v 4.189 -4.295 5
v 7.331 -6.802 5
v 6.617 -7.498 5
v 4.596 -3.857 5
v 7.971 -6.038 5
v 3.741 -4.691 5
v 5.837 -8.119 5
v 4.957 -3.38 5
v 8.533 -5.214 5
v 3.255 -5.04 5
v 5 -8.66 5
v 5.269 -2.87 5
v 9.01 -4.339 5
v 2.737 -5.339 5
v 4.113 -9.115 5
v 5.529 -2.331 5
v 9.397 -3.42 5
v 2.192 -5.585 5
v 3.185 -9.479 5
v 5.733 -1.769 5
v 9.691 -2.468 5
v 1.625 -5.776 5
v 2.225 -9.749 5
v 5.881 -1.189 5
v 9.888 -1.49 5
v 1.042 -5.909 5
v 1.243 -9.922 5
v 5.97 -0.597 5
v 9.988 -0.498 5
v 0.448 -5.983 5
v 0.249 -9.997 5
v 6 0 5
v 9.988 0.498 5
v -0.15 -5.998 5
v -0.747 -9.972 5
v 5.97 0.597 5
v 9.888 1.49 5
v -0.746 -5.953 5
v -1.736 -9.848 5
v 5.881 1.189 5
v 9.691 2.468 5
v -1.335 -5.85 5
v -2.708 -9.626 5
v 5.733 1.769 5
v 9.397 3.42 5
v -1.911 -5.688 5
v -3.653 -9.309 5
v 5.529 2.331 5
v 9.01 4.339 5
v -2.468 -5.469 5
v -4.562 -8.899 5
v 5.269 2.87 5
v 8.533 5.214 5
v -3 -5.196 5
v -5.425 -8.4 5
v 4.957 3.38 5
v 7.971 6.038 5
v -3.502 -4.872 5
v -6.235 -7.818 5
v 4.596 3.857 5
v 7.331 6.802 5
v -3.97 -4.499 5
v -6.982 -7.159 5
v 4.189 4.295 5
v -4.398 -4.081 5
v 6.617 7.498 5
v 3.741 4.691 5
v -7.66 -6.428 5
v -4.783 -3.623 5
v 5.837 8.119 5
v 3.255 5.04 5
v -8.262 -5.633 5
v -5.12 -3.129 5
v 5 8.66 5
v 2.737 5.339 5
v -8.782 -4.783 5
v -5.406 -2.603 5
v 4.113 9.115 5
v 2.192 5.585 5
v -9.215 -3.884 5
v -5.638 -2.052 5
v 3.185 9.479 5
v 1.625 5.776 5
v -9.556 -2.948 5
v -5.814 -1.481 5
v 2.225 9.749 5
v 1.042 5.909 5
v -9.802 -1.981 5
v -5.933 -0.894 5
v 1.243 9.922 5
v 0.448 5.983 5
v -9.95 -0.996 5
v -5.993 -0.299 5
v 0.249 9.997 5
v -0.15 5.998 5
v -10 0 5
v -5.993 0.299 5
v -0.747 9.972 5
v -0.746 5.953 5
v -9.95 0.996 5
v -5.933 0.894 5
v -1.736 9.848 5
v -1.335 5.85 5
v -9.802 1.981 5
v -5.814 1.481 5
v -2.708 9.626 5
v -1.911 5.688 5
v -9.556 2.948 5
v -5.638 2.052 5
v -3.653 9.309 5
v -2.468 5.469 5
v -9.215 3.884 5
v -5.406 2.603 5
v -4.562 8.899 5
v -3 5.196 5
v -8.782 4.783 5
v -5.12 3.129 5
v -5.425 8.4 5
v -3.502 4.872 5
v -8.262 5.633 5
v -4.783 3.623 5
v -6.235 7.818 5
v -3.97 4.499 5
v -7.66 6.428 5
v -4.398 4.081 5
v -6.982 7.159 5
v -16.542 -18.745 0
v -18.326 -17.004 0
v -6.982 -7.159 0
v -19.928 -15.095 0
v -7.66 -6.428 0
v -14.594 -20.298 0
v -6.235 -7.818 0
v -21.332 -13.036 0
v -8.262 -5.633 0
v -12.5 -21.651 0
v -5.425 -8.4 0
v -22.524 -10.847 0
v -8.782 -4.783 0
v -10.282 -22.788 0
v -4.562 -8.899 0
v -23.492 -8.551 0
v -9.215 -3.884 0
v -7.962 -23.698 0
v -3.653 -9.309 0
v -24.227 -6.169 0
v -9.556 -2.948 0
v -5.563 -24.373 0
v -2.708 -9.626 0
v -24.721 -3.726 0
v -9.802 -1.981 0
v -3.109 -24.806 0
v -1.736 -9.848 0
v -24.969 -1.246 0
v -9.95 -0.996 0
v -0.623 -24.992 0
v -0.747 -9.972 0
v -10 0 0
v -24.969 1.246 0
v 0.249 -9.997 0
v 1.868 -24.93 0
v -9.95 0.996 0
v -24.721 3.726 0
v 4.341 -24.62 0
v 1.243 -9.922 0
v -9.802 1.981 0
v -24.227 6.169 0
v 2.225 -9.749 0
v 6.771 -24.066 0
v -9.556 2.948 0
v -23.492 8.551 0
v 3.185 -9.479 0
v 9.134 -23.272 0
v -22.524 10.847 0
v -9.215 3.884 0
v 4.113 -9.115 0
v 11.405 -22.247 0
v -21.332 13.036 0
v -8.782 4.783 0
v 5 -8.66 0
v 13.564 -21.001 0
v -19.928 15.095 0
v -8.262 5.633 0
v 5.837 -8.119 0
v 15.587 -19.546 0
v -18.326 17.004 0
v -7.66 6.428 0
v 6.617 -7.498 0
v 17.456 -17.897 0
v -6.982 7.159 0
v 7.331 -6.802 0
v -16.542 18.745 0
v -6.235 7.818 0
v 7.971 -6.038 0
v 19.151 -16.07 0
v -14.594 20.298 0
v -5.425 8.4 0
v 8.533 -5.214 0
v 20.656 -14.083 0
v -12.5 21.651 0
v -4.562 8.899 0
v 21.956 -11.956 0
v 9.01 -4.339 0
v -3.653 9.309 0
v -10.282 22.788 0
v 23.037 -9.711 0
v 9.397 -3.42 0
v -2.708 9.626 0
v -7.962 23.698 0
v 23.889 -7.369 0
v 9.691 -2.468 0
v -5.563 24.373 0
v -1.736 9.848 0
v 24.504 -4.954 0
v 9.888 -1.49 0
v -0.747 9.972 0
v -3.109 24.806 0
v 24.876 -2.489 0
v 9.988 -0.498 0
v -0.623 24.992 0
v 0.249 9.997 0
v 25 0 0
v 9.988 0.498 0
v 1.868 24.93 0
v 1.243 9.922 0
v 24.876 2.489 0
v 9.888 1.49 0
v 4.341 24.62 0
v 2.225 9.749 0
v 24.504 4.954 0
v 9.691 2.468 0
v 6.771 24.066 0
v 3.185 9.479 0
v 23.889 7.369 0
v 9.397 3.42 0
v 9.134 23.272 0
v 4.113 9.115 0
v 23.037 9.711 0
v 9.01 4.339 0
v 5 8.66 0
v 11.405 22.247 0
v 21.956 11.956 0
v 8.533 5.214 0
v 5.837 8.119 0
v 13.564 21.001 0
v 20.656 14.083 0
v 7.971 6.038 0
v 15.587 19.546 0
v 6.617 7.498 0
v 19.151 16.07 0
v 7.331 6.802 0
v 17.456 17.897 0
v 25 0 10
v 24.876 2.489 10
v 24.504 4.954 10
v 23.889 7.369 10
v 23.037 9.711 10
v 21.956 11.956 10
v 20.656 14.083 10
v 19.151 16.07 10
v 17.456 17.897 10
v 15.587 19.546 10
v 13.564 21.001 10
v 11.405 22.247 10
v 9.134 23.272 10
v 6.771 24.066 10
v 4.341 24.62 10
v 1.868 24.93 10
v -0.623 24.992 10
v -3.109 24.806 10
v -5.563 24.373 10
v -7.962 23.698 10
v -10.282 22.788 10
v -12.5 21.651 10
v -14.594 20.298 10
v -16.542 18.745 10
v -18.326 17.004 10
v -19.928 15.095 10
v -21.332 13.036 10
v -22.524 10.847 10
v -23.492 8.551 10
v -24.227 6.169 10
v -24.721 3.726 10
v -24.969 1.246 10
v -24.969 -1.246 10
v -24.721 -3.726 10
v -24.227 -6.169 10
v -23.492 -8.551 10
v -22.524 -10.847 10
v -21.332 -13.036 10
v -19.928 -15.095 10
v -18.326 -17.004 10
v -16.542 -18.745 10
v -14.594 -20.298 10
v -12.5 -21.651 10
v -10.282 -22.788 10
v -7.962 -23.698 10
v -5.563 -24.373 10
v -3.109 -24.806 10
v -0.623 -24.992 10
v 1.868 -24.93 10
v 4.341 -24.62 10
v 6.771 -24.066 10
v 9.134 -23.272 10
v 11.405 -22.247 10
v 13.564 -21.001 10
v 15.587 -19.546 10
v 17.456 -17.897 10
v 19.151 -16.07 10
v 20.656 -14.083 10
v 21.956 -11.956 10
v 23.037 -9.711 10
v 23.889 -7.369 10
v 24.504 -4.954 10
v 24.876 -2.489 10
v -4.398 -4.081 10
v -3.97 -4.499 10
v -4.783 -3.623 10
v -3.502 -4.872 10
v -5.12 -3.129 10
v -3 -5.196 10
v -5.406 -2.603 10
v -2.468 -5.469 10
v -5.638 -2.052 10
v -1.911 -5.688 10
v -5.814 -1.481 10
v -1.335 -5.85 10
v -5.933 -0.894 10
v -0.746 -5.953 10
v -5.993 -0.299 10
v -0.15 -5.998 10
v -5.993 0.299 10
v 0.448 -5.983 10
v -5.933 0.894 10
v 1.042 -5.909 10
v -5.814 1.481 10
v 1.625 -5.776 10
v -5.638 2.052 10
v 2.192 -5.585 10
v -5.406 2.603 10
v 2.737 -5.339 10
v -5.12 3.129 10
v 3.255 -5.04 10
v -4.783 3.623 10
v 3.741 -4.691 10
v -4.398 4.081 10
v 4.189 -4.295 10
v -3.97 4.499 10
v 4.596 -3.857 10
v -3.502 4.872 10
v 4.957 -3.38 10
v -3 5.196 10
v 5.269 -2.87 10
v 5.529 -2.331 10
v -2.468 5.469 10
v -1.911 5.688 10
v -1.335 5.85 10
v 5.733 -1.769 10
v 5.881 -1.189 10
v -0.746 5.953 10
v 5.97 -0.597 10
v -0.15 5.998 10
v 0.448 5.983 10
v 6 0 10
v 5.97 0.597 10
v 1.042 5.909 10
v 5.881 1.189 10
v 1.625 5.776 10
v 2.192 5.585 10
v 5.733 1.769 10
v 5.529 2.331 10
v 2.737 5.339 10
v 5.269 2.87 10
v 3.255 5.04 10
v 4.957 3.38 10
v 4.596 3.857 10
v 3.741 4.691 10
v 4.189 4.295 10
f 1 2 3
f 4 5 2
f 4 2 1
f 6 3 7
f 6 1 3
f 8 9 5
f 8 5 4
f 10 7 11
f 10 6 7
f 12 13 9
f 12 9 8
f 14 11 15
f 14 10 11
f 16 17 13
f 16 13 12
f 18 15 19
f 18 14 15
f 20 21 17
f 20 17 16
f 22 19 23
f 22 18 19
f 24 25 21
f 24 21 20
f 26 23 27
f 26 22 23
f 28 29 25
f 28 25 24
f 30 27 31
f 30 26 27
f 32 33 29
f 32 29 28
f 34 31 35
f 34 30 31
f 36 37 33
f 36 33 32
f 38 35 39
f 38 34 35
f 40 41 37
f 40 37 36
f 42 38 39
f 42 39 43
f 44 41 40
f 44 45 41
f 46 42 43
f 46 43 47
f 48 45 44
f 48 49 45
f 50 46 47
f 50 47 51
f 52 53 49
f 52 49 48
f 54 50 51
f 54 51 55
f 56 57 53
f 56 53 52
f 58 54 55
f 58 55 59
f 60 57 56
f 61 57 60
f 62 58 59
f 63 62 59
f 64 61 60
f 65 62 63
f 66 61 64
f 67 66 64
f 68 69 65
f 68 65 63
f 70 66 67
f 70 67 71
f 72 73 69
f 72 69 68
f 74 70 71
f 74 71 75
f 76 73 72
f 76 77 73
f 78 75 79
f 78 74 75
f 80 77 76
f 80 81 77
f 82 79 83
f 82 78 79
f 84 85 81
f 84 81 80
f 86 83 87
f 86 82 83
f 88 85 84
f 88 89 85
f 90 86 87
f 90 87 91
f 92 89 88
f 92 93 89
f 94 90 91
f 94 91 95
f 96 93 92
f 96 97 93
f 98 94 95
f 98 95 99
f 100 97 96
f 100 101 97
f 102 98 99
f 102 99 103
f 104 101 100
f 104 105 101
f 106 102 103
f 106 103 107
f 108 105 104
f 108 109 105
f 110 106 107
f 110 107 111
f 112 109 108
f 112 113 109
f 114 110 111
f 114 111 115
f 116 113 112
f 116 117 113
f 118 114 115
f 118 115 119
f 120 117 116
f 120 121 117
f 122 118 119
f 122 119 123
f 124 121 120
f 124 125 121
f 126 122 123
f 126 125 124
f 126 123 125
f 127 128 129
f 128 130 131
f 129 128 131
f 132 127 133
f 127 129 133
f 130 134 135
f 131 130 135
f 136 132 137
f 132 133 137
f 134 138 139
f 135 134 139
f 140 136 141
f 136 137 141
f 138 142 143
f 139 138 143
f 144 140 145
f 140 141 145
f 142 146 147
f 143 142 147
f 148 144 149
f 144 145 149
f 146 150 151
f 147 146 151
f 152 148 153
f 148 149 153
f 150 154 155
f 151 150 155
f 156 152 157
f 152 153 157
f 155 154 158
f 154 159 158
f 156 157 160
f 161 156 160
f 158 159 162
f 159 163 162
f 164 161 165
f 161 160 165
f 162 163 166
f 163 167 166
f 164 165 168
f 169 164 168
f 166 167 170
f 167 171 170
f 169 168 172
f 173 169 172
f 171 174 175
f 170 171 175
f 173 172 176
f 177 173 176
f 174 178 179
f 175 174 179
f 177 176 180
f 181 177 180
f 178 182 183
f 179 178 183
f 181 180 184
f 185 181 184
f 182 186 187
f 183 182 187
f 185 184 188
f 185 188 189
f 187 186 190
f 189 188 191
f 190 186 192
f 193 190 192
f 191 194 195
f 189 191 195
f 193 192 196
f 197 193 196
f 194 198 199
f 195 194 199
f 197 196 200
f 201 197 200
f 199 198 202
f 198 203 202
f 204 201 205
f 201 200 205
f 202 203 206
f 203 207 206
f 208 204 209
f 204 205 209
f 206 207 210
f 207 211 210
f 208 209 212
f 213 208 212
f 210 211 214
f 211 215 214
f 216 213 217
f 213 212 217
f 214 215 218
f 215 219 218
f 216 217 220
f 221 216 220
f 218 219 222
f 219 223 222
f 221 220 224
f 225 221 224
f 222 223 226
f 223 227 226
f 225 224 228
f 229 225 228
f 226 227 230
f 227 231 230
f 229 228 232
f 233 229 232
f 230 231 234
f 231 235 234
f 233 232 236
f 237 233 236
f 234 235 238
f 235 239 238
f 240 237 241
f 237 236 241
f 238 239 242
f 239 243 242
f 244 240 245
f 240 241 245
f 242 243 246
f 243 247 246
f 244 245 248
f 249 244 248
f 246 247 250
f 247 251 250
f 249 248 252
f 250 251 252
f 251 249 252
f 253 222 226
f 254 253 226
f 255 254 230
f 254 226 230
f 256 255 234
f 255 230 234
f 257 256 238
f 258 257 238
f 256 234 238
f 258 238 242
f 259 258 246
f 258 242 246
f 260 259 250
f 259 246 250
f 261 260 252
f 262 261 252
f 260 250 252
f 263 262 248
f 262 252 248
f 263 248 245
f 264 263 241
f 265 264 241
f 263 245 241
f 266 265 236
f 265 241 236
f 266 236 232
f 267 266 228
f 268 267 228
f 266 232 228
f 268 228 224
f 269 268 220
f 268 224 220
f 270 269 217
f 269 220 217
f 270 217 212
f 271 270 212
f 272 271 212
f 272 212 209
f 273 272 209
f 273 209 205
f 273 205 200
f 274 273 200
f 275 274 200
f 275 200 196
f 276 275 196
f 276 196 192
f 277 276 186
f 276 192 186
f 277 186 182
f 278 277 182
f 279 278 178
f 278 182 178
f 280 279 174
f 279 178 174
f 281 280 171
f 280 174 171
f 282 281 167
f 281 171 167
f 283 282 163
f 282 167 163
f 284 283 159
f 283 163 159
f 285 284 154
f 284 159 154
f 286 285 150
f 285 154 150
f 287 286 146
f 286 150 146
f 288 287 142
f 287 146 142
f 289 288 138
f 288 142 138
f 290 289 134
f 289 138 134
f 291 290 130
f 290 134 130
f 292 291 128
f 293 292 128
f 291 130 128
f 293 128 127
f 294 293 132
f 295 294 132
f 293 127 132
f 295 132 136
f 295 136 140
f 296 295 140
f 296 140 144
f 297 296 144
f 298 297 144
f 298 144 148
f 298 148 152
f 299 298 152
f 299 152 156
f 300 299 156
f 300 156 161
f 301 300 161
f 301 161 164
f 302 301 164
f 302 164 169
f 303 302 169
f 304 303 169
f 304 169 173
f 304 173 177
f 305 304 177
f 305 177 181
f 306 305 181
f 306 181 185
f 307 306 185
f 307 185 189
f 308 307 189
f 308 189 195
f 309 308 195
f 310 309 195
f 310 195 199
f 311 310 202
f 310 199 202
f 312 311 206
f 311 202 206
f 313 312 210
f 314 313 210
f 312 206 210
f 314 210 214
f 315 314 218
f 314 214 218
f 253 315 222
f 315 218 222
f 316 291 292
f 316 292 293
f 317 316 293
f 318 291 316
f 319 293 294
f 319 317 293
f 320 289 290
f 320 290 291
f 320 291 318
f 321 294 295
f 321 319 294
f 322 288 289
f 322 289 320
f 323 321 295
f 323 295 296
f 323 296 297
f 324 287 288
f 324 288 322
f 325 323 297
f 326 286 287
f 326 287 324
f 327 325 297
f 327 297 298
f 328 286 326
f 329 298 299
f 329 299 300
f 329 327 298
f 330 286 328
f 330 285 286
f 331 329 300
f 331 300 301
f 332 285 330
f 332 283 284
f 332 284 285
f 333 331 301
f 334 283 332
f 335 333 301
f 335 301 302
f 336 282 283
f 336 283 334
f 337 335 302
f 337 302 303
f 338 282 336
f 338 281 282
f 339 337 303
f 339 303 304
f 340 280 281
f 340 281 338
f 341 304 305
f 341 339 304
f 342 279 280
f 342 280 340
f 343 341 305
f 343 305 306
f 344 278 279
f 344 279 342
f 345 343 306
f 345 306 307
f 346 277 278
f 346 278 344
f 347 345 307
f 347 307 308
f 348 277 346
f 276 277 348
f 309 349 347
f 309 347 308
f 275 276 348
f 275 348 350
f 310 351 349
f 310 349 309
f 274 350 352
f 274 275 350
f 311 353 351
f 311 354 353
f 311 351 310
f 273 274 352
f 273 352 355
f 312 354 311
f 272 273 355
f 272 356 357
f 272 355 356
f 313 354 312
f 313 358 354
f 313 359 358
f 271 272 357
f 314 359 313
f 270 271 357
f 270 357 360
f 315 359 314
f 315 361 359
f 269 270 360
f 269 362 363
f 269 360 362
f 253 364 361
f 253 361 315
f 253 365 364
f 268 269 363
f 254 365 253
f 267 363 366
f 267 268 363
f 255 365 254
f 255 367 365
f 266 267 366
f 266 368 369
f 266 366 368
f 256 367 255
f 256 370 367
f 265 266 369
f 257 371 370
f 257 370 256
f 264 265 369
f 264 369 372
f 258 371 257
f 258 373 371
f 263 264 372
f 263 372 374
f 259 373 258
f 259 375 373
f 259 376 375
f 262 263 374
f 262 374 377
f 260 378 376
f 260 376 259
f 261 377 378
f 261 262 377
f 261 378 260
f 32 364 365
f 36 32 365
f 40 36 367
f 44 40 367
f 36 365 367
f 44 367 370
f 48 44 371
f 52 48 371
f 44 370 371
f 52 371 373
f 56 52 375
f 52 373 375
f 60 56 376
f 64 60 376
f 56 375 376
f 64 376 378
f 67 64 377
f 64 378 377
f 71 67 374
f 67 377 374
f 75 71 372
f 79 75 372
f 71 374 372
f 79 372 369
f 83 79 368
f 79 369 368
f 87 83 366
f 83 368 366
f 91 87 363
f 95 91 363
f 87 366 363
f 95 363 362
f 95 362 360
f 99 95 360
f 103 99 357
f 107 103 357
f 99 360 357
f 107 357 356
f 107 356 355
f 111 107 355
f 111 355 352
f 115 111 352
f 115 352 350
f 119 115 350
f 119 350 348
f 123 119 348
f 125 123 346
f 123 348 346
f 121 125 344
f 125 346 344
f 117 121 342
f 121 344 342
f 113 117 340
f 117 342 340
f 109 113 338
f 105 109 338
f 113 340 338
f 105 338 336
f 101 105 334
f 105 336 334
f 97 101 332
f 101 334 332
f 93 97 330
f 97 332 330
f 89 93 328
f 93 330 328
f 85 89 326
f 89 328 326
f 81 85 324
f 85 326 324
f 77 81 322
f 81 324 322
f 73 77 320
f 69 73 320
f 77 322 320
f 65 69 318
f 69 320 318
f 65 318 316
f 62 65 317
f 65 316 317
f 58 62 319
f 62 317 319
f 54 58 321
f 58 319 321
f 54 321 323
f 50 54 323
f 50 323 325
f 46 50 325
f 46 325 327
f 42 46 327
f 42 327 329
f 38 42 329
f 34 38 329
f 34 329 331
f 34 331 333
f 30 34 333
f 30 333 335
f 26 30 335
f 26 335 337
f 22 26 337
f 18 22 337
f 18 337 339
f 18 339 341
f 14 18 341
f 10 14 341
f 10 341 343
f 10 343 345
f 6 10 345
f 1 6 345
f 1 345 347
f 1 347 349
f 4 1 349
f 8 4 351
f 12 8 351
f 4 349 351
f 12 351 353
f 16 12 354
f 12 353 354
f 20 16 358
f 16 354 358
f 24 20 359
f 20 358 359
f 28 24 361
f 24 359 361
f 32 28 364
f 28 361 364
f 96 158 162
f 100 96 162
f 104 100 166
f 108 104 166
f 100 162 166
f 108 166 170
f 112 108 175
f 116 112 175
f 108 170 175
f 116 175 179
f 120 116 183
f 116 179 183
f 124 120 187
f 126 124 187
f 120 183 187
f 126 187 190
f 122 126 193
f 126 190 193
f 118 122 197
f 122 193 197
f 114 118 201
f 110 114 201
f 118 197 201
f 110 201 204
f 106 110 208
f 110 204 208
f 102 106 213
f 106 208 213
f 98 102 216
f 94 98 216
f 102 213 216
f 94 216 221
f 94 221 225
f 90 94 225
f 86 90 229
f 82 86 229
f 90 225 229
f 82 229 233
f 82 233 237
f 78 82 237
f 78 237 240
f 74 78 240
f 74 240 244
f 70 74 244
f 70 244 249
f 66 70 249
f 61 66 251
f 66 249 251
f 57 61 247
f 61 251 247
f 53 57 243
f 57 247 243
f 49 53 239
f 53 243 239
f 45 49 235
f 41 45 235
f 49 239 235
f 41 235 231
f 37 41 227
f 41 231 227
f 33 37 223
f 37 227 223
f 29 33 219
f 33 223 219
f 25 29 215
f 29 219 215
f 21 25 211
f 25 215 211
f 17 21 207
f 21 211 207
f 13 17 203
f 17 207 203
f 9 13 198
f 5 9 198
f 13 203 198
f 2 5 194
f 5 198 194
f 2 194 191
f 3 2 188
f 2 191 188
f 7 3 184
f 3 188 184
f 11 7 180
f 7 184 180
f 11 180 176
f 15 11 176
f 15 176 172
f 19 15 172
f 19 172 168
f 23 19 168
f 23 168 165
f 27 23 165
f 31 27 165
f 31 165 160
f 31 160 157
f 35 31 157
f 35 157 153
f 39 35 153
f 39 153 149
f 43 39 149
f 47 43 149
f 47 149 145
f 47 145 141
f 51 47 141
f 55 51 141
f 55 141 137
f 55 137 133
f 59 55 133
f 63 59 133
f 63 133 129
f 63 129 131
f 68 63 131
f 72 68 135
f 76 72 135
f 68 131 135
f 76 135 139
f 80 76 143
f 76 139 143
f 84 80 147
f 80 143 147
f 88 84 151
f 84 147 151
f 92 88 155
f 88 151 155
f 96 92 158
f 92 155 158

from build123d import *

# Parameters (mm, degrees)
SKETCH2_R           = 25
BOSS_EXTRUDE1_DEPTH = 10
SKETCH3_R           = 6
CUT_EXTRUDE1_DEPTH  = 5
SKETCH4_R           = 10
CUT_EXTRUDE2_DEPTH  = 5


with BuildPart() as part:
    # Sketch2 → Boss-Extrude1 (new body)
    with BuildSketch(Plane.XY):
        Circle(SKETCH2_R)
    extrude(amount=BOSS_EXTRUDE1_DEPTH)

    # Sketch3 → Cut-Extrude1 (cut)
    with BuildSketch(Plane.XY.offset(10)):
        Circle(SKETCH3_R)
    extrude(amount=-CUT_EXTRUDE1_DEPTH, mode=Mode.SUBTRACT)

    # Sketch4 → Cut-Extrude2 (cut)
    with BuildSketch(Plane(origin=(0, 0, 0), x_dir=(-1, 0, 0), z_dir=(0, 0, -1))):
        Circle(SKETCH4_R)
    extrude(amount=-CUT_EXTRUDE2_DEPTH, mode=Mode.SUBTRACT)


solid = part.part
